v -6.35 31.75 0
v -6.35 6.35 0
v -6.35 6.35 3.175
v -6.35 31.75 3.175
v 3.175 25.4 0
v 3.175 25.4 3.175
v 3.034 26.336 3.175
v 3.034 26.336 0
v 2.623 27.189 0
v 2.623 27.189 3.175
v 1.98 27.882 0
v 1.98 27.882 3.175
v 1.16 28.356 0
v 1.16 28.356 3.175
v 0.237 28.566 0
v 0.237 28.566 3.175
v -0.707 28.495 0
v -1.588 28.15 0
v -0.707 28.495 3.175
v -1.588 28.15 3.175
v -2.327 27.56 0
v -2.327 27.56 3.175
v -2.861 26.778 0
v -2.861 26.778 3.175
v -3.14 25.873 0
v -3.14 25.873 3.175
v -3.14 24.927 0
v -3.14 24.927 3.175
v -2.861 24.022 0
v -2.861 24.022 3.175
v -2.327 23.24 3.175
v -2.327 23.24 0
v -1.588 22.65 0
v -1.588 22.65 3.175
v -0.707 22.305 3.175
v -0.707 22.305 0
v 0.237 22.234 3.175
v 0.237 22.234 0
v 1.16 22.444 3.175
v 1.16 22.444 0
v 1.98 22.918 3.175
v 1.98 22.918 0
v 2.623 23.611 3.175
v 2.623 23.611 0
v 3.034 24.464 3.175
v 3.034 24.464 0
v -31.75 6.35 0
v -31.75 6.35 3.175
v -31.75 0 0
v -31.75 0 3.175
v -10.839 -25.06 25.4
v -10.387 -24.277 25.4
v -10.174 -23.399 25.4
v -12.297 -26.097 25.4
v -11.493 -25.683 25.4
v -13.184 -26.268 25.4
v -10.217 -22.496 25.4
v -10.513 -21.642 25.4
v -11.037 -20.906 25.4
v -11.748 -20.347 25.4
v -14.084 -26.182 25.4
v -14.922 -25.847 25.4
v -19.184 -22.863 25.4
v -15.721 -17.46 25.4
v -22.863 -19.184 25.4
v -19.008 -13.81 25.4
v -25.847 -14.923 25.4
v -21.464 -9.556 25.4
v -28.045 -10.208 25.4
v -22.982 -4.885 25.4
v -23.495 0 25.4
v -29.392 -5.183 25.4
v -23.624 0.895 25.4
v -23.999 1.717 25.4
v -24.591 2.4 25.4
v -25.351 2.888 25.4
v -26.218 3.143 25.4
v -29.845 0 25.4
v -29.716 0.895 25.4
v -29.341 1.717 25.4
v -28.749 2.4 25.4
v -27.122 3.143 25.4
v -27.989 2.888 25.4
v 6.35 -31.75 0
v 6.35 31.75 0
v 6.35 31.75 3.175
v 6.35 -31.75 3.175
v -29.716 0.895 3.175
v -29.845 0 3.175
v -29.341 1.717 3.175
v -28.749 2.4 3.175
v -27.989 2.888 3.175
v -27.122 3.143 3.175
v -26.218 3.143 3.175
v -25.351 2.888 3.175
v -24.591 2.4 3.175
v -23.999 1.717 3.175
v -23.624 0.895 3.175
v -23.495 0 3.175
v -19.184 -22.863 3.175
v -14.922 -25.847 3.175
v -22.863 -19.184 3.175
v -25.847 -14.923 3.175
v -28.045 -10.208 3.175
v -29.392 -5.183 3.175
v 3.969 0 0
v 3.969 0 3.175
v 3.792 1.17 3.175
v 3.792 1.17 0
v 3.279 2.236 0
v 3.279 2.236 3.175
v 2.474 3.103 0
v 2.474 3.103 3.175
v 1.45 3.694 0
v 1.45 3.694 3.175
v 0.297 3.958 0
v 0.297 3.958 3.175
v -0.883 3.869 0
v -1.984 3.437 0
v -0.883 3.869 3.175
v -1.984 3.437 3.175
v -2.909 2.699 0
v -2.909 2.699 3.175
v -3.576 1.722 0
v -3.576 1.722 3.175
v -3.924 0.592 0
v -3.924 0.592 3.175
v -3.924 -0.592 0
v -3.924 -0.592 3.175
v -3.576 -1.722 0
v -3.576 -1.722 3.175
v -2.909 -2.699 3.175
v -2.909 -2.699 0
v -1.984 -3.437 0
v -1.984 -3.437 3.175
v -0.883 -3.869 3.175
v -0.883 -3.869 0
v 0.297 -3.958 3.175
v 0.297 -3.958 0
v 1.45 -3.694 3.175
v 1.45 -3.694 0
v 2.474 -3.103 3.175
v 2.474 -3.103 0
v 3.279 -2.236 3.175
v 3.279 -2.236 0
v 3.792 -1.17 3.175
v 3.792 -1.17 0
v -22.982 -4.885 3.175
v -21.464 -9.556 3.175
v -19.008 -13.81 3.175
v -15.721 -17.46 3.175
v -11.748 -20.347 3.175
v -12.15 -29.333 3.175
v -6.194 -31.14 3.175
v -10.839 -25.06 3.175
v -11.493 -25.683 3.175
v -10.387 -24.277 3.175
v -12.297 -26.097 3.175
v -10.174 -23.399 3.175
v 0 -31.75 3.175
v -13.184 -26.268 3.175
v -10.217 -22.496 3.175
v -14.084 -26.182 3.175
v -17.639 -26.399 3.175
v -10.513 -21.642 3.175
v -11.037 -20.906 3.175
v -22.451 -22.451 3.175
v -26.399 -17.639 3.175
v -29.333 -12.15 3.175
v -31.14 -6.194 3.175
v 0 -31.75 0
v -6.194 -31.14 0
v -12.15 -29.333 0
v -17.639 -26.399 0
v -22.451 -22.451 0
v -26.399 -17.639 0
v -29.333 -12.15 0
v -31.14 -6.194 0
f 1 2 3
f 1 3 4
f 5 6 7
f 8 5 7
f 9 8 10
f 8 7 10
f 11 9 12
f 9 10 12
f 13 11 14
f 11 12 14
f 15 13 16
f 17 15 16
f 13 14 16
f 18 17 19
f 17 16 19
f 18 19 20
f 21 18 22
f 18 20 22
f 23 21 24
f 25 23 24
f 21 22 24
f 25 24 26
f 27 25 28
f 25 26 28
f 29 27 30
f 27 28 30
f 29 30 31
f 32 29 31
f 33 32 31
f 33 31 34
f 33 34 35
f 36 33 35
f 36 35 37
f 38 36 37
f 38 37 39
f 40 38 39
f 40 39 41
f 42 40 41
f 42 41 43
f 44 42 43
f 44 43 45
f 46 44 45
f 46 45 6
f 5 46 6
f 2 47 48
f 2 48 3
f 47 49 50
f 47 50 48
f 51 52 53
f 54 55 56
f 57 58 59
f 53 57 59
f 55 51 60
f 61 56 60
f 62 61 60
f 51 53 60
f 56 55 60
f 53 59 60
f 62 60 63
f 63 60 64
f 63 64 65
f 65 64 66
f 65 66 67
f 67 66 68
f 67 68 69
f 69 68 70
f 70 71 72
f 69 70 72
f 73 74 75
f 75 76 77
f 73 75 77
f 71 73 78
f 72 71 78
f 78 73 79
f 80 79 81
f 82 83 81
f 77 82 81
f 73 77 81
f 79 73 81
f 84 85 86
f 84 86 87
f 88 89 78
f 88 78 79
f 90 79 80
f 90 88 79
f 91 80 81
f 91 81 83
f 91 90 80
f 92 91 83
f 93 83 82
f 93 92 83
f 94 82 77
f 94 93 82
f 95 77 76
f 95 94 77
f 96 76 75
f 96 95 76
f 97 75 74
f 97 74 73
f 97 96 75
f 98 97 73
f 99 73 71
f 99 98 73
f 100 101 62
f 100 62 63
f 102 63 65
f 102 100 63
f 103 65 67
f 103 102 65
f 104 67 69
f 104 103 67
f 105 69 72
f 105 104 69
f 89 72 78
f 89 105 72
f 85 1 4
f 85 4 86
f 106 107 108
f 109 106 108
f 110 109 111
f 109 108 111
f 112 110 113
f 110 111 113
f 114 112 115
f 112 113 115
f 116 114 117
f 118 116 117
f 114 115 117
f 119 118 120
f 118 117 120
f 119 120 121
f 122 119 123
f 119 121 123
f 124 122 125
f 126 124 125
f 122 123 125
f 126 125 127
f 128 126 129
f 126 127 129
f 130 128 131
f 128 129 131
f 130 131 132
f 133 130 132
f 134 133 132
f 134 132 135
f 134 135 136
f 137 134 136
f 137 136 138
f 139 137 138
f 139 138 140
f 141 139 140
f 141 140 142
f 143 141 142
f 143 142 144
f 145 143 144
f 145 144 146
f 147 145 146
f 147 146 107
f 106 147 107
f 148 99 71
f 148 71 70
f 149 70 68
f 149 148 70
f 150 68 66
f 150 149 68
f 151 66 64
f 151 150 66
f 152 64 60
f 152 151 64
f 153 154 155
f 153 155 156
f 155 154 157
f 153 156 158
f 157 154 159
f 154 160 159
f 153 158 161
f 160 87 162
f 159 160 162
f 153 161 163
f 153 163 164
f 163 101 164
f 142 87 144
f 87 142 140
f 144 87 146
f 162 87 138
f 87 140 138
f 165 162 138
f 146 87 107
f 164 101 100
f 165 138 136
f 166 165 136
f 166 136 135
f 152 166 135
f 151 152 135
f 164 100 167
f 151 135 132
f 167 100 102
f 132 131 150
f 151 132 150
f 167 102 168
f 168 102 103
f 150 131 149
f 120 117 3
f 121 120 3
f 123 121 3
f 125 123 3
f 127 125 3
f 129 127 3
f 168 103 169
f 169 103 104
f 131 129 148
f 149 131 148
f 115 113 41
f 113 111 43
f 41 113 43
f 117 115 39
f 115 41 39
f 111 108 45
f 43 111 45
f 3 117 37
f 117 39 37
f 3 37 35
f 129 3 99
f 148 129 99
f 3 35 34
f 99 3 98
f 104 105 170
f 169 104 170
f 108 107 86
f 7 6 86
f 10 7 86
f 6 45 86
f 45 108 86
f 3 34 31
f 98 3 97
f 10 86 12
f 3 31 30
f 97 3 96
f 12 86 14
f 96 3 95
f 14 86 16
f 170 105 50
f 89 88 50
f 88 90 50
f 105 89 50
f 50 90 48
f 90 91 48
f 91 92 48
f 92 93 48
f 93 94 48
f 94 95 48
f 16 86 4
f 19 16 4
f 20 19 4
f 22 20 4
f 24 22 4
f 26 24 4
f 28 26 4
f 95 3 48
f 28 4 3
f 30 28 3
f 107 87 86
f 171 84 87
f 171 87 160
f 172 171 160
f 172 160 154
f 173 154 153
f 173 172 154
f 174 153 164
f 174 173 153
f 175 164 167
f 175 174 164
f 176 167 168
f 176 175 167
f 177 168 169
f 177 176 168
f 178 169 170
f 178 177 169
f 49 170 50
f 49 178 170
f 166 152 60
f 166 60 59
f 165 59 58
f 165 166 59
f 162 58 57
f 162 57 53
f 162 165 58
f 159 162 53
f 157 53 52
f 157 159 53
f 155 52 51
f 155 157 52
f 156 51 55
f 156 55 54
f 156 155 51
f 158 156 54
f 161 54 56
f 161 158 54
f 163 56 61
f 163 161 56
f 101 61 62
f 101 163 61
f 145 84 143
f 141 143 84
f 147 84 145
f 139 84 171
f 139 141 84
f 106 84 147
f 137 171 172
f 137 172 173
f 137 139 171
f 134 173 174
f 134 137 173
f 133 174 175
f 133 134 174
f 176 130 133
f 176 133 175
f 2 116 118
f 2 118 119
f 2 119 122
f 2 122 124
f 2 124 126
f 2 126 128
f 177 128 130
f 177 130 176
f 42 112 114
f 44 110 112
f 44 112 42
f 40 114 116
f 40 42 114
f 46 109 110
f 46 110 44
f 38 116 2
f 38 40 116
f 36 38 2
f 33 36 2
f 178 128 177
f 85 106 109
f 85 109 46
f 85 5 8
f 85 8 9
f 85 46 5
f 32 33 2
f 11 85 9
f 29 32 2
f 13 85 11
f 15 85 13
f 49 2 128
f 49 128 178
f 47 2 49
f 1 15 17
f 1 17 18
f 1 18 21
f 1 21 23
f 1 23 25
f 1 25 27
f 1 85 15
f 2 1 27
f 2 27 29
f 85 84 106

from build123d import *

# Parameters (mm, degrees)
BOSS_EXTRUDE1_DEPTH = 3.175
SKETCH4_R           = 3.96875
SKETCH4_R_2         = 3.175
CUT_EXTRUDE1_DEPTH  = 4.175
BOSS_EXTRUDE3_DEPTH = 22.225


with BuildPart() as part:
    # Sketch1 → Boss-Extrude1 (new body)
    with BuildSketch(Plane.XY):
        with BuildLine():
            Line((-31.75, 0), (-31.75, 6.35))
            Line((-31.75, 6.35), (-6.35, 6.35))
            Line((-6.35, 6.35), (-6.35, 31.75))
            Line((-6.35, 31.75), (6.35, 31.75))
            Line((6.35, 31.75), (6.35, 6.35))
            Line((6.35, 6.35), (6.35, -31.75))
            Line((6.35, -31.75), (0, -31.75))
            ThreePointArc((0, -31.75), (-22.450640303, -22.450640303), (-31.75, 0))
        make_face()
    extrude(amount=BOSS_EXTRUDE1_DEPTH)

    # Sketch4 → Cut-Extrude1 (cut, through all)
    with BuildSketch(Plane.XY.offset(3.175)):
        Circle(SKETCH4_R)
        with Locations((0, 25.4)):
            Circle(SKETCH4_R_2)
    extrude(amount=-CUT_EXTRUDE1_DEPTH, mode=Mode.SUBTRACT)

    # Sketch6 → Boss-Extrude3 (add)
    with BuildSketch(Plane.XY.offset(3.175)):
        with BuildLine():
            ThreePointArc((-29.845, 0), (-26.67, 3.175), (-23.495, 0))
            ThreePointArc((-23.495, 0), (-20.347266862, -11.7475), (-11.7475, -20.347266862))
            ThreePointArc((-11.7475, -20.347266862), (-10.585369343, -24.684397519), (-14.9225, -25.846528176))
            ThreePointArc((-14.9225, -25.846528176), (-25.846528176, -14.9225), (-29.845, 0))
        make_face()
    extrude(amount=BOSS_EXTRUDE3_DEPTH)


solid = part.part
